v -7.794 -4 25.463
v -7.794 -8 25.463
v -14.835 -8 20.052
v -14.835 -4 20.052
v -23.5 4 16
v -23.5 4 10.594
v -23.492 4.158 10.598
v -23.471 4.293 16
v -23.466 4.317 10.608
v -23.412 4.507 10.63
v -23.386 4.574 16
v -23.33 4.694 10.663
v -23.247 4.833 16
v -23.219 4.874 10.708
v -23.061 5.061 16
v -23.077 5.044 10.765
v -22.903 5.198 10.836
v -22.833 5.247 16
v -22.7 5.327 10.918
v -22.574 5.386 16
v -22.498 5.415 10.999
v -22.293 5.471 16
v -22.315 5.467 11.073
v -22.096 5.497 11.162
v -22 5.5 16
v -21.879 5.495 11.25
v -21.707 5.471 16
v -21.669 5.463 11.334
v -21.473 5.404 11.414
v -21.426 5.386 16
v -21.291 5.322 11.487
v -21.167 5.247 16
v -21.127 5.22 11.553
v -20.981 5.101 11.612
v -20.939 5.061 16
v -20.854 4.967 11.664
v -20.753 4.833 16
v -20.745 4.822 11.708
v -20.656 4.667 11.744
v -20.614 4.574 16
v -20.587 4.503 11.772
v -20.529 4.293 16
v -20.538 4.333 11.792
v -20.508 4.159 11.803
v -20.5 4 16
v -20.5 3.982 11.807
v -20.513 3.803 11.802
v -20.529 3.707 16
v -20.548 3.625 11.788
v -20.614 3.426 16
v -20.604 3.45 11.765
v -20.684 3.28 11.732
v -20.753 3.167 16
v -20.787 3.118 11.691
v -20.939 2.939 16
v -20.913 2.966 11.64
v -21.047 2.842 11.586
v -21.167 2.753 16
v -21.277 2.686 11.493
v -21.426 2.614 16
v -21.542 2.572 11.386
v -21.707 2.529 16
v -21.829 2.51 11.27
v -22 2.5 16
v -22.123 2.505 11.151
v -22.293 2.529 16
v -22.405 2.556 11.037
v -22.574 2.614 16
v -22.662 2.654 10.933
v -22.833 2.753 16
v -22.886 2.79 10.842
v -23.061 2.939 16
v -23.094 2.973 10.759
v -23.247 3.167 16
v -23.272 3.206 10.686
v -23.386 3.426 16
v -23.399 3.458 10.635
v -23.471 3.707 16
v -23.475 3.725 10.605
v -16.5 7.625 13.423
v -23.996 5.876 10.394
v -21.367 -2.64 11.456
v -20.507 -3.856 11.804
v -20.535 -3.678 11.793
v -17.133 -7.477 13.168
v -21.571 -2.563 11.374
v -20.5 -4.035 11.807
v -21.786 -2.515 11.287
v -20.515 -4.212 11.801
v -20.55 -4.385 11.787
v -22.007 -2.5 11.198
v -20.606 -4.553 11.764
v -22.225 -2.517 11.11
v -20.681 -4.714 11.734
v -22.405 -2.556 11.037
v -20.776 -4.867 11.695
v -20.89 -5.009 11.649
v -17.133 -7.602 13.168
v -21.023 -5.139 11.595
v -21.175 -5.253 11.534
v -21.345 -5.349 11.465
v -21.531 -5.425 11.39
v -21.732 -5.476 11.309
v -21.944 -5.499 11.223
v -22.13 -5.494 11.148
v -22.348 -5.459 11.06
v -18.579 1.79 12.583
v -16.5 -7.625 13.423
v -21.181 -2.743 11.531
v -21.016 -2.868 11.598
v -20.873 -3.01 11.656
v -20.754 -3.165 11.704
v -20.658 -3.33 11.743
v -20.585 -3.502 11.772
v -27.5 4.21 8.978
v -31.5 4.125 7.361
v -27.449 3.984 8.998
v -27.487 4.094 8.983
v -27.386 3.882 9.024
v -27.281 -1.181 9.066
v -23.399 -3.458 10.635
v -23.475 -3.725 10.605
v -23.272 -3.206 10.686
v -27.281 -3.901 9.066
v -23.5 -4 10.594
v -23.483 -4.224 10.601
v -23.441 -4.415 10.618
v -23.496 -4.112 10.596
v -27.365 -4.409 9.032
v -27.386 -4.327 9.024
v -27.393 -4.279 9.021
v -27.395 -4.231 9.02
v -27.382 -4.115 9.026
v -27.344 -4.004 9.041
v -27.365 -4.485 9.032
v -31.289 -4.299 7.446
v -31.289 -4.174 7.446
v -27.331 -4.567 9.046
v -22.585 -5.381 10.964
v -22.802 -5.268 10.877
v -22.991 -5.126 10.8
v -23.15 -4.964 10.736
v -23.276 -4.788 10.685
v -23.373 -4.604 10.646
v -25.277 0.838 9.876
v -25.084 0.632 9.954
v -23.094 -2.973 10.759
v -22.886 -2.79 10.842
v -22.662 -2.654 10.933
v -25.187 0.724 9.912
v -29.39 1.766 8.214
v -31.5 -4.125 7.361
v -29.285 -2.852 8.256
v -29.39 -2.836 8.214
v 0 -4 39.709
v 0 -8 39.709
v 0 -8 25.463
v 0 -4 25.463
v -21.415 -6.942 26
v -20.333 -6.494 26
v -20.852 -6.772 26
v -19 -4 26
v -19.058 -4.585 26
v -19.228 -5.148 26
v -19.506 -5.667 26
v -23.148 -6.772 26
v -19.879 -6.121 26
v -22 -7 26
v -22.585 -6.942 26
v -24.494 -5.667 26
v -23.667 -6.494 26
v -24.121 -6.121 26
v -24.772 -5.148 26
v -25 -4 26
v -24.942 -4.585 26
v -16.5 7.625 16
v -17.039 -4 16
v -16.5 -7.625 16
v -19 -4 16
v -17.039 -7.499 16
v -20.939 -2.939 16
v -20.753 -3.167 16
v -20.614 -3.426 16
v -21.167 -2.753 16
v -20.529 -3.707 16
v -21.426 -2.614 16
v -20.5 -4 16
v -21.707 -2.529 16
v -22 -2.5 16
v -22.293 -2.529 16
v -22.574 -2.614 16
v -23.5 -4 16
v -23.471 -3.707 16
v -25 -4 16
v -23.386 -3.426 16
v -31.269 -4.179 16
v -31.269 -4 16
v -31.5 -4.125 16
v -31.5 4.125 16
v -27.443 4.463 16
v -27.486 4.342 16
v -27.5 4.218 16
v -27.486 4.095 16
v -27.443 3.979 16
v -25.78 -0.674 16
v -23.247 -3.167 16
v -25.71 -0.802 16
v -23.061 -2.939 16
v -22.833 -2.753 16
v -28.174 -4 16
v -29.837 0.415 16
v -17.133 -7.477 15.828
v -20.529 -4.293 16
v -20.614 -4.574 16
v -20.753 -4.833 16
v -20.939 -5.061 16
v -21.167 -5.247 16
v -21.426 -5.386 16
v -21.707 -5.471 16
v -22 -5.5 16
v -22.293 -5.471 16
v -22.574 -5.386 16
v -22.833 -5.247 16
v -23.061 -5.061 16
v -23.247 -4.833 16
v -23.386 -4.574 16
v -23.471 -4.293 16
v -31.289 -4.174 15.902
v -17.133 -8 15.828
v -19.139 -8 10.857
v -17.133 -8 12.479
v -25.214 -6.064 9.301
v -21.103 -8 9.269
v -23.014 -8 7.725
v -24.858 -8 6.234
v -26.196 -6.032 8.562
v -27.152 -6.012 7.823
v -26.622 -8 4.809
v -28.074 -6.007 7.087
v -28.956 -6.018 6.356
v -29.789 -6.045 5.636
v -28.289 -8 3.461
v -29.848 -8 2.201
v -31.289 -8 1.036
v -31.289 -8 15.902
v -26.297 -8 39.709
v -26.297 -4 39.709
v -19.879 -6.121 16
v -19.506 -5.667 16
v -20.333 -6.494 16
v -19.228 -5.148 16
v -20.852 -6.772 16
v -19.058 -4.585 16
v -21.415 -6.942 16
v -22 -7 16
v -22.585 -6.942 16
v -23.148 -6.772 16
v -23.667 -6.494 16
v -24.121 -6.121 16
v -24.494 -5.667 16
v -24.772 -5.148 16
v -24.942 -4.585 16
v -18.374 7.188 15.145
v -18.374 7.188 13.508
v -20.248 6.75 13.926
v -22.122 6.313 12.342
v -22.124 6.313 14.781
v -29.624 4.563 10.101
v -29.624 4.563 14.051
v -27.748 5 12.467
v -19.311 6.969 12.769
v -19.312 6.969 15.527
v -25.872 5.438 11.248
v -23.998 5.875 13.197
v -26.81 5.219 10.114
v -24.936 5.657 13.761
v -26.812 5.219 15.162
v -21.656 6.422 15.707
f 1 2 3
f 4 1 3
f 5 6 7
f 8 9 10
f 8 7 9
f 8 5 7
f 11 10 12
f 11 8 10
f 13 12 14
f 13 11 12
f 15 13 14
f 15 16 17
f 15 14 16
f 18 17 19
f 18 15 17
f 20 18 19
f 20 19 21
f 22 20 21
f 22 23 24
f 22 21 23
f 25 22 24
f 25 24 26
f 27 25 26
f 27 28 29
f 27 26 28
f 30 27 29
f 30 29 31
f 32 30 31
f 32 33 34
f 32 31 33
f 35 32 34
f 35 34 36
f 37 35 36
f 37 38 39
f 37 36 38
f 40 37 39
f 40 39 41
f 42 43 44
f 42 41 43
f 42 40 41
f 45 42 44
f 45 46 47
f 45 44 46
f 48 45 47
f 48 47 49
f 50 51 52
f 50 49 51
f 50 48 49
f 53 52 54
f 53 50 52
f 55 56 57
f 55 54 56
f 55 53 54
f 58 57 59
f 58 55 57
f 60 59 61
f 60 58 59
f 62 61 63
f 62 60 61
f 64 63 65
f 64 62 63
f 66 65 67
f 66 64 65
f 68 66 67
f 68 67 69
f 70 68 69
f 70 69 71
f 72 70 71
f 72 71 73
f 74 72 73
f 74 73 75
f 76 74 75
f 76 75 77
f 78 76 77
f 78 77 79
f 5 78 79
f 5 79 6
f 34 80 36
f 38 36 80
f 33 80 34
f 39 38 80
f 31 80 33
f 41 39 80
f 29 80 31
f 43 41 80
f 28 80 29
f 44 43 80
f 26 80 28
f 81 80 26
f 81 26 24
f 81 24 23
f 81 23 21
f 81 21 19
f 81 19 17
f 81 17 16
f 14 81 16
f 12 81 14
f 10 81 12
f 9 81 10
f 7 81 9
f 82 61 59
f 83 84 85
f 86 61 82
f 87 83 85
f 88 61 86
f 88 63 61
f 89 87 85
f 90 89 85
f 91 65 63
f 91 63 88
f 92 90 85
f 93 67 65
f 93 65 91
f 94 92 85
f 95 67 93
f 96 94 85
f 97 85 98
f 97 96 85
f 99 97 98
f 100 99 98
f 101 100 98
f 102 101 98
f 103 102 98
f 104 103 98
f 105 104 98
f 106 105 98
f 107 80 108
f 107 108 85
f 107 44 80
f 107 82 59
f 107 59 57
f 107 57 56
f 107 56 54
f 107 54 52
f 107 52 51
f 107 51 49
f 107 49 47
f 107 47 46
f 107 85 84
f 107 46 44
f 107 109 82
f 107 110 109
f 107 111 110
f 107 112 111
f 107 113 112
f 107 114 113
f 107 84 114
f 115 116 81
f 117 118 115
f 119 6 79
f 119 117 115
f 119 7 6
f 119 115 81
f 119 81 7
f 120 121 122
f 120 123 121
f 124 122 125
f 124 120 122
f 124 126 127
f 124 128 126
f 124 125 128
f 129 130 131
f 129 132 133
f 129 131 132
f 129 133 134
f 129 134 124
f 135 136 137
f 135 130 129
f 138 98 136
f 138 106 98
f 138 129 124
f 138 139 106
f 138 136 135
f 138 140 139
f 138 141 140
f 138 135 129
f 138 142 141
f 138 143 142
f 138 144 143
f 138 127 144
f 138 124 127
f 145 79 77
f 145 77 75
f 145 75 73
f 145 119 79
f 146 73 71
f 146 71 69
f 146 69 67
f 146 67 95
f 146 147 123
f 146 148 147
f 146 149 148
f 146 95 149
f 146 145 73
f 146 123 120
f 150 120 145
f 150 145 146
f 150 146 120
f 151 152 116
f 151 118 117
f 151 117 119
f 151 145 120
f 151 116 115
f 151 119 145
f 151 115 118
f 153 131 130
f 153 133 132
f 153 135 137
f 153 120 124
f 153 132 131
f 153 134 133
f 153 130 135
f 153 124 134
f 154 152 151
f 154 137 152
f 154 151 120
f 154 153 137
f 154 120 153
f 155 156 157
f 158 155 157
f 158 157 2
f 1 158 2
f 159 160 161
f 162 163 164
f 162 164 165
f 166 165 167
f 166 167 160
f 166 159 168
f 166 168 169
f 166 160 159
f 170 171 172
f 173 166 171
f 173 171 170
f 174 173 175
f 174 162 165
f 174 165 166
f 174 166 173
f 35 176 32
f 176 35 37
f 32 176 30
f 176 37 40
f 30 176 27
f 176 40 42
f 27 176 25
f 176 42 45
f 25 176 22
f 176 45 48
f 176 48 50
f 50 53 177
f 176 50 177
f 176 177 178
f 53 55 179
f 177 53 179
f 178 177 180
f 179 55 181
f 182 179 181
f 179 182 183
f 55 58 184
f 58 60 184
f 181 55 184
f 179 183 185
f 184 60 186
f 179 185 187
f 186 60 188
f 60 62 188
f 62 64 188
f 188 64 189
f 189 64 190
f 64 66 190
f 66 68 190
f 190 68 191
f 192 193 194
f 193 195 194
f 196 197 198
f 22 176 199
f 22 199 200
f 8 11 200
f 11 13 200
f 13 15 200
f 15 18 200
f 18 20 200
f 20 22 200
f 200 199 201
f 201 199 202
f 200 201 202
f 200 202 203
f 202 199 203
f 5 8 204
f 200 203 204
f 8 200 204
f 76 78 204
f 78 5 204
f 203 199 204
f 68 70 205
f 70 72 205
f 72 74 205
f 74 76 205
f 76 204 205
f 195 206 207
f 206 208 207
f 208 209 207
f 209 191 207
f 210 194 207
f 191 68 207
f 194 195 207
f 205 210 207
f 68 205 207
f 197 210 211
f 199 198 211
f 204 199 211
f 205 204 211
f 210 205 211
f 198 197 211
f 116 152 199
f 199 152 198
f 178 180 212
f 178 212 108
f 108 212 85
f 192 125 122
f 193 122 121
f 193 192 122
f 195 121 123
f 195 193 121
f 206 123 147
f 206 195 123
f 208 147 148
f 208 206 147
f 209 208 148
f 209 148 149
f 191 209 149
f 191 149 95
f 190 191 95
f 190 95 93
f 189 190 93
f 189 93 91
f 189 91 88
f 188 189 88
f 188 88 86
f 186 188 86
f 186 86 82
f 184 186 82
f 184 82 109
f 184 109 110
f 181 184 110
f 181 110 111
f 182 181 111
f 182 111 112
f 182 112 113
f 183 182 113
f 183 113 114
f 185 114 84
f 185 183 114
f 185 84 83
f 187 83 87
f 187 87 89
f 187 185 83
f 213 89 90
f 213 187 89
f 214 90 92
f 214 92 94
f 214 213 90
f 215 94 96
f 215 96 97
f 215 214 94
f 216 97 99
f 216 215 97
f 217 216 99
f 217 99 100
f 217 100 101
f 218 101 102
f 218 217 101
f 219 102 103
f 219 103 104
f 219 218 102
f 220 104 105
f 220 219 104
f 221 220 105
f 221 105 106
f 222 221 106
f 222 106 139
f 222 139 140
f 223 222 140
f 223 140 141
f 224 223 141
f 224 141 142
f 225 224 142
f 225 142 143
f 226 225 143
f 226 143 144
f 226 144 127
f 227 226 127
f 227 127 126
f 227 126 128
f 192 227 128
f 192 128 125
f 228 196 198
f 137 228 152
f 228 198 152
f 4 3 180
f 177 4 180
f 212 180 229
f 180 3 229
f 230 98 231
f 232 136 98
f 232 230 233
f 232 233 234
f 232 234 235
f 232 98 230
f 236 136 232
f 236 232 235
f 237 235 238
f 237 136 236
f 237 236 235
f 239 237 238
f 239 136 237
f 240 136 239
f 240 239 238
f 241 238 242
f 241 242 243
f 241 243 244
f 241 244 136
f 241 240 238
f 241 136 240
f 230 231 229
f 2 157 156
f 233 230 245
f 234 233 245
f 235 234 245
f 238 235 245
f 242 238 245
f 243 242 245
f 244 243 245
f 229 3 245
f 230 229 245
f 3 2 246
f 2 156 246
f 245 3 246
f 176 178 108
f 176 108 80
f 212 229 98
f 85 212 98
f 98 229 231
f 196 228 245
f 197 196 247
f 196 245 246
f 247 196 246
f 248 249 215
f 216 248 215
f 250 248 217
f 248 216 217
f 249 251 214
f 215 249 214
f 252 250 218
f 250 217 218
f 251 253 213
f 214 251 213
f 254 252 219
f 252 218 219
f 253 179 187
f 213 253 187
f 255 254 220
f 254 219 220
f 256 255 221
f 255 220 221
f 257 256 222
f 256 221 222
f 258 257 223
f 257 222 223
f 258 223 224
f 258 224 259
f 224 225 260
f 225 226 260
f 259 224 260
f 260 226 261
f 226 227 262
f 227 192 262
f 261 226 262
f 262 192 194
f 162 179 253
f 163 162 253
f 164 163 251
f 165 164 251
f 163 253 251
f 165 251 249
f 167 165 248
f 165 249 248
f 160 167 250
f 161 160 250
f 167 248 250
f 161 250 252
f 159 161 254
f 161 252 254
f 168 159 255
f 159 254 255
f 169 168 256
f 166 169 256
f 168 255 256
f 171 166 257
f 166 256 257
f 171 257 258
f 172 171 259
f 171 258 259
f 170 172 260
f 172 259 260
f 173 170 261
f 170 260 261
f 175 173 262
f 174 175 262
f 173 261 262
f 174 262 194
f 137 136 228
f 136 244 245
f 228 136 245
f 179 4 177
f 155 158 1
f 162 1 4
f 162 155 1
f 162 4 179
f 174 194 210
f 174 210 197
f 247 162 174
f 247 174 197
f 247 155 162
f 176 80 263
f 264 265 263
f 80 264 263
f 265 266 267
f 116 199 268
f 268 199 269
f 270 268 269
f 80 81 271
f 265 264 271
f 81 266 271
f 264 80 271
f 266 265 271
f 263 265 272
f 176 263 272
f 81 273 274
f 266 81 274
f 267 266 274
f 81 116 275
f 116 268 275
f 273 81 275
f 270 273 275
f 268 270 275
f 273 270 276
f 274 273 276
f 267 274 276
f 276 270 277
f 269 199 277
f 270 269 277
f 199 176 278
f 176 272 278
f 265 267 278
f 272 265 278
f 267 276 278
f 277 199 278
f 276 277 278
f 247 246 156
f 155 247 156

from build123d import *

# Parameters (mm, degrees)
SKETCH040_R  = 1.5
PAD029_DEPTH = 20
SKETCH045_R  = 3
PAD031_DEPTH = 10
SKETCH037_W  = 15.25
SKETCH037_H  = 2.793113
SKETCH038_W  = 8.25
SKETCH038_H  = 8.85529
PAD030_DEPTH = 4


with BuildPart() as mountingblock_cutout:
    # Sketch042 → Loft002 section 0
    with BuildSketch(Plane.YZ.offset(16.5)):
        Polygon((15.5, 0), (7.75, 13.423394), (-7.75, 13.423394), (-15.5, 0), (-7.75, -13.423394), (7.75, -13.423394), align=None)
    # Sketch043 → Loft002 section 1
    with BuildSketch(Plane.YZ.offset(31.5)):
        Polygon((8.5, 0), (4.25, 7.361216), (-4.25, 7.361216), (-8.5, 0), (-4.25, -7.361216), (4.25, -7.361216), align=None)
    loft(ruled=True)


with BuildPart() as screw_cutouts:
    # Sketch040 → Pad029 (new body)
    with BuildSketch(Plane.XY.offset(16)):
        with Locations((22, 4)):
            Circle(SKETCH040_R)
        with Locations((22, -4)):
            Circle(SKETCH040_R)
    extrude(amount=-PAD029_DEPTH)


with BuildPart() as cutouts:
    # Sketch045 → Pad031 (new body)
    with BuildSketch(Plane.XY.offset(16)):
        with Locations((22, 4)):
            Circle(SKETCH045_R)
        with Locations((22, -4)):
            Circle(SKETCH045_R)
    extrude(amount=PAD031_DEPTH)

    # Fusion004008: union MountingBlock Cutout, Screw Cutouts
    add(mountingblock_cutout.part)
    add(screw_cutouts.part)


with BuildPart() as mountingblock_mount:
    # Sketch037 → Loft001 section 0
    with BuildSketch(Plane.YZ.offset(16.5)):
        with Locations((0, 14.603444)):
            Rectangle(SKETCH037_W, SKETCH037_H)
    # Sketch038 → Loft001 section 1
    with BuildSketch(Plane.YZ.offset(31.5)):
        with Locations((0, 11.572355)):
            Rectangle(SKETCH038_W, SKETCH038_H)
    loft(ruled=True)


with BuildPart() as base_plate:
    # Sketch041 → Pad030 (new body)
    with BuildSketch(Plane.XZ.offset(8)):
        Polygon((31.289345, 0), (31.289345, 15.901777), (26.297165, 39.708817), (0, 39.708817), (0, 25.462919), (7.794133, 25.462919), (14.835288, 20.052349), (17.132925, 15.827662), (17.132925, 0), align=None)
    extrude(amount=-PAD030_DEPTH)

    # Fusion004009: union MountingBlock Mount
    add(mountingblock_mount.part)

    # Cut007003: cut cutouts
    add(cutouts.part, mode=Mode.SUBTRACT)


with BuildPart() as part_mirroring:
    # Part__Mirroring: instance of Base Plate
    add(base_plate.part.mirror(Plane(origin=(0, 0, 0), x_dir=(0, -1, 0), z_dir=(1, 0, 0))))


solid = part_mirroring.part
